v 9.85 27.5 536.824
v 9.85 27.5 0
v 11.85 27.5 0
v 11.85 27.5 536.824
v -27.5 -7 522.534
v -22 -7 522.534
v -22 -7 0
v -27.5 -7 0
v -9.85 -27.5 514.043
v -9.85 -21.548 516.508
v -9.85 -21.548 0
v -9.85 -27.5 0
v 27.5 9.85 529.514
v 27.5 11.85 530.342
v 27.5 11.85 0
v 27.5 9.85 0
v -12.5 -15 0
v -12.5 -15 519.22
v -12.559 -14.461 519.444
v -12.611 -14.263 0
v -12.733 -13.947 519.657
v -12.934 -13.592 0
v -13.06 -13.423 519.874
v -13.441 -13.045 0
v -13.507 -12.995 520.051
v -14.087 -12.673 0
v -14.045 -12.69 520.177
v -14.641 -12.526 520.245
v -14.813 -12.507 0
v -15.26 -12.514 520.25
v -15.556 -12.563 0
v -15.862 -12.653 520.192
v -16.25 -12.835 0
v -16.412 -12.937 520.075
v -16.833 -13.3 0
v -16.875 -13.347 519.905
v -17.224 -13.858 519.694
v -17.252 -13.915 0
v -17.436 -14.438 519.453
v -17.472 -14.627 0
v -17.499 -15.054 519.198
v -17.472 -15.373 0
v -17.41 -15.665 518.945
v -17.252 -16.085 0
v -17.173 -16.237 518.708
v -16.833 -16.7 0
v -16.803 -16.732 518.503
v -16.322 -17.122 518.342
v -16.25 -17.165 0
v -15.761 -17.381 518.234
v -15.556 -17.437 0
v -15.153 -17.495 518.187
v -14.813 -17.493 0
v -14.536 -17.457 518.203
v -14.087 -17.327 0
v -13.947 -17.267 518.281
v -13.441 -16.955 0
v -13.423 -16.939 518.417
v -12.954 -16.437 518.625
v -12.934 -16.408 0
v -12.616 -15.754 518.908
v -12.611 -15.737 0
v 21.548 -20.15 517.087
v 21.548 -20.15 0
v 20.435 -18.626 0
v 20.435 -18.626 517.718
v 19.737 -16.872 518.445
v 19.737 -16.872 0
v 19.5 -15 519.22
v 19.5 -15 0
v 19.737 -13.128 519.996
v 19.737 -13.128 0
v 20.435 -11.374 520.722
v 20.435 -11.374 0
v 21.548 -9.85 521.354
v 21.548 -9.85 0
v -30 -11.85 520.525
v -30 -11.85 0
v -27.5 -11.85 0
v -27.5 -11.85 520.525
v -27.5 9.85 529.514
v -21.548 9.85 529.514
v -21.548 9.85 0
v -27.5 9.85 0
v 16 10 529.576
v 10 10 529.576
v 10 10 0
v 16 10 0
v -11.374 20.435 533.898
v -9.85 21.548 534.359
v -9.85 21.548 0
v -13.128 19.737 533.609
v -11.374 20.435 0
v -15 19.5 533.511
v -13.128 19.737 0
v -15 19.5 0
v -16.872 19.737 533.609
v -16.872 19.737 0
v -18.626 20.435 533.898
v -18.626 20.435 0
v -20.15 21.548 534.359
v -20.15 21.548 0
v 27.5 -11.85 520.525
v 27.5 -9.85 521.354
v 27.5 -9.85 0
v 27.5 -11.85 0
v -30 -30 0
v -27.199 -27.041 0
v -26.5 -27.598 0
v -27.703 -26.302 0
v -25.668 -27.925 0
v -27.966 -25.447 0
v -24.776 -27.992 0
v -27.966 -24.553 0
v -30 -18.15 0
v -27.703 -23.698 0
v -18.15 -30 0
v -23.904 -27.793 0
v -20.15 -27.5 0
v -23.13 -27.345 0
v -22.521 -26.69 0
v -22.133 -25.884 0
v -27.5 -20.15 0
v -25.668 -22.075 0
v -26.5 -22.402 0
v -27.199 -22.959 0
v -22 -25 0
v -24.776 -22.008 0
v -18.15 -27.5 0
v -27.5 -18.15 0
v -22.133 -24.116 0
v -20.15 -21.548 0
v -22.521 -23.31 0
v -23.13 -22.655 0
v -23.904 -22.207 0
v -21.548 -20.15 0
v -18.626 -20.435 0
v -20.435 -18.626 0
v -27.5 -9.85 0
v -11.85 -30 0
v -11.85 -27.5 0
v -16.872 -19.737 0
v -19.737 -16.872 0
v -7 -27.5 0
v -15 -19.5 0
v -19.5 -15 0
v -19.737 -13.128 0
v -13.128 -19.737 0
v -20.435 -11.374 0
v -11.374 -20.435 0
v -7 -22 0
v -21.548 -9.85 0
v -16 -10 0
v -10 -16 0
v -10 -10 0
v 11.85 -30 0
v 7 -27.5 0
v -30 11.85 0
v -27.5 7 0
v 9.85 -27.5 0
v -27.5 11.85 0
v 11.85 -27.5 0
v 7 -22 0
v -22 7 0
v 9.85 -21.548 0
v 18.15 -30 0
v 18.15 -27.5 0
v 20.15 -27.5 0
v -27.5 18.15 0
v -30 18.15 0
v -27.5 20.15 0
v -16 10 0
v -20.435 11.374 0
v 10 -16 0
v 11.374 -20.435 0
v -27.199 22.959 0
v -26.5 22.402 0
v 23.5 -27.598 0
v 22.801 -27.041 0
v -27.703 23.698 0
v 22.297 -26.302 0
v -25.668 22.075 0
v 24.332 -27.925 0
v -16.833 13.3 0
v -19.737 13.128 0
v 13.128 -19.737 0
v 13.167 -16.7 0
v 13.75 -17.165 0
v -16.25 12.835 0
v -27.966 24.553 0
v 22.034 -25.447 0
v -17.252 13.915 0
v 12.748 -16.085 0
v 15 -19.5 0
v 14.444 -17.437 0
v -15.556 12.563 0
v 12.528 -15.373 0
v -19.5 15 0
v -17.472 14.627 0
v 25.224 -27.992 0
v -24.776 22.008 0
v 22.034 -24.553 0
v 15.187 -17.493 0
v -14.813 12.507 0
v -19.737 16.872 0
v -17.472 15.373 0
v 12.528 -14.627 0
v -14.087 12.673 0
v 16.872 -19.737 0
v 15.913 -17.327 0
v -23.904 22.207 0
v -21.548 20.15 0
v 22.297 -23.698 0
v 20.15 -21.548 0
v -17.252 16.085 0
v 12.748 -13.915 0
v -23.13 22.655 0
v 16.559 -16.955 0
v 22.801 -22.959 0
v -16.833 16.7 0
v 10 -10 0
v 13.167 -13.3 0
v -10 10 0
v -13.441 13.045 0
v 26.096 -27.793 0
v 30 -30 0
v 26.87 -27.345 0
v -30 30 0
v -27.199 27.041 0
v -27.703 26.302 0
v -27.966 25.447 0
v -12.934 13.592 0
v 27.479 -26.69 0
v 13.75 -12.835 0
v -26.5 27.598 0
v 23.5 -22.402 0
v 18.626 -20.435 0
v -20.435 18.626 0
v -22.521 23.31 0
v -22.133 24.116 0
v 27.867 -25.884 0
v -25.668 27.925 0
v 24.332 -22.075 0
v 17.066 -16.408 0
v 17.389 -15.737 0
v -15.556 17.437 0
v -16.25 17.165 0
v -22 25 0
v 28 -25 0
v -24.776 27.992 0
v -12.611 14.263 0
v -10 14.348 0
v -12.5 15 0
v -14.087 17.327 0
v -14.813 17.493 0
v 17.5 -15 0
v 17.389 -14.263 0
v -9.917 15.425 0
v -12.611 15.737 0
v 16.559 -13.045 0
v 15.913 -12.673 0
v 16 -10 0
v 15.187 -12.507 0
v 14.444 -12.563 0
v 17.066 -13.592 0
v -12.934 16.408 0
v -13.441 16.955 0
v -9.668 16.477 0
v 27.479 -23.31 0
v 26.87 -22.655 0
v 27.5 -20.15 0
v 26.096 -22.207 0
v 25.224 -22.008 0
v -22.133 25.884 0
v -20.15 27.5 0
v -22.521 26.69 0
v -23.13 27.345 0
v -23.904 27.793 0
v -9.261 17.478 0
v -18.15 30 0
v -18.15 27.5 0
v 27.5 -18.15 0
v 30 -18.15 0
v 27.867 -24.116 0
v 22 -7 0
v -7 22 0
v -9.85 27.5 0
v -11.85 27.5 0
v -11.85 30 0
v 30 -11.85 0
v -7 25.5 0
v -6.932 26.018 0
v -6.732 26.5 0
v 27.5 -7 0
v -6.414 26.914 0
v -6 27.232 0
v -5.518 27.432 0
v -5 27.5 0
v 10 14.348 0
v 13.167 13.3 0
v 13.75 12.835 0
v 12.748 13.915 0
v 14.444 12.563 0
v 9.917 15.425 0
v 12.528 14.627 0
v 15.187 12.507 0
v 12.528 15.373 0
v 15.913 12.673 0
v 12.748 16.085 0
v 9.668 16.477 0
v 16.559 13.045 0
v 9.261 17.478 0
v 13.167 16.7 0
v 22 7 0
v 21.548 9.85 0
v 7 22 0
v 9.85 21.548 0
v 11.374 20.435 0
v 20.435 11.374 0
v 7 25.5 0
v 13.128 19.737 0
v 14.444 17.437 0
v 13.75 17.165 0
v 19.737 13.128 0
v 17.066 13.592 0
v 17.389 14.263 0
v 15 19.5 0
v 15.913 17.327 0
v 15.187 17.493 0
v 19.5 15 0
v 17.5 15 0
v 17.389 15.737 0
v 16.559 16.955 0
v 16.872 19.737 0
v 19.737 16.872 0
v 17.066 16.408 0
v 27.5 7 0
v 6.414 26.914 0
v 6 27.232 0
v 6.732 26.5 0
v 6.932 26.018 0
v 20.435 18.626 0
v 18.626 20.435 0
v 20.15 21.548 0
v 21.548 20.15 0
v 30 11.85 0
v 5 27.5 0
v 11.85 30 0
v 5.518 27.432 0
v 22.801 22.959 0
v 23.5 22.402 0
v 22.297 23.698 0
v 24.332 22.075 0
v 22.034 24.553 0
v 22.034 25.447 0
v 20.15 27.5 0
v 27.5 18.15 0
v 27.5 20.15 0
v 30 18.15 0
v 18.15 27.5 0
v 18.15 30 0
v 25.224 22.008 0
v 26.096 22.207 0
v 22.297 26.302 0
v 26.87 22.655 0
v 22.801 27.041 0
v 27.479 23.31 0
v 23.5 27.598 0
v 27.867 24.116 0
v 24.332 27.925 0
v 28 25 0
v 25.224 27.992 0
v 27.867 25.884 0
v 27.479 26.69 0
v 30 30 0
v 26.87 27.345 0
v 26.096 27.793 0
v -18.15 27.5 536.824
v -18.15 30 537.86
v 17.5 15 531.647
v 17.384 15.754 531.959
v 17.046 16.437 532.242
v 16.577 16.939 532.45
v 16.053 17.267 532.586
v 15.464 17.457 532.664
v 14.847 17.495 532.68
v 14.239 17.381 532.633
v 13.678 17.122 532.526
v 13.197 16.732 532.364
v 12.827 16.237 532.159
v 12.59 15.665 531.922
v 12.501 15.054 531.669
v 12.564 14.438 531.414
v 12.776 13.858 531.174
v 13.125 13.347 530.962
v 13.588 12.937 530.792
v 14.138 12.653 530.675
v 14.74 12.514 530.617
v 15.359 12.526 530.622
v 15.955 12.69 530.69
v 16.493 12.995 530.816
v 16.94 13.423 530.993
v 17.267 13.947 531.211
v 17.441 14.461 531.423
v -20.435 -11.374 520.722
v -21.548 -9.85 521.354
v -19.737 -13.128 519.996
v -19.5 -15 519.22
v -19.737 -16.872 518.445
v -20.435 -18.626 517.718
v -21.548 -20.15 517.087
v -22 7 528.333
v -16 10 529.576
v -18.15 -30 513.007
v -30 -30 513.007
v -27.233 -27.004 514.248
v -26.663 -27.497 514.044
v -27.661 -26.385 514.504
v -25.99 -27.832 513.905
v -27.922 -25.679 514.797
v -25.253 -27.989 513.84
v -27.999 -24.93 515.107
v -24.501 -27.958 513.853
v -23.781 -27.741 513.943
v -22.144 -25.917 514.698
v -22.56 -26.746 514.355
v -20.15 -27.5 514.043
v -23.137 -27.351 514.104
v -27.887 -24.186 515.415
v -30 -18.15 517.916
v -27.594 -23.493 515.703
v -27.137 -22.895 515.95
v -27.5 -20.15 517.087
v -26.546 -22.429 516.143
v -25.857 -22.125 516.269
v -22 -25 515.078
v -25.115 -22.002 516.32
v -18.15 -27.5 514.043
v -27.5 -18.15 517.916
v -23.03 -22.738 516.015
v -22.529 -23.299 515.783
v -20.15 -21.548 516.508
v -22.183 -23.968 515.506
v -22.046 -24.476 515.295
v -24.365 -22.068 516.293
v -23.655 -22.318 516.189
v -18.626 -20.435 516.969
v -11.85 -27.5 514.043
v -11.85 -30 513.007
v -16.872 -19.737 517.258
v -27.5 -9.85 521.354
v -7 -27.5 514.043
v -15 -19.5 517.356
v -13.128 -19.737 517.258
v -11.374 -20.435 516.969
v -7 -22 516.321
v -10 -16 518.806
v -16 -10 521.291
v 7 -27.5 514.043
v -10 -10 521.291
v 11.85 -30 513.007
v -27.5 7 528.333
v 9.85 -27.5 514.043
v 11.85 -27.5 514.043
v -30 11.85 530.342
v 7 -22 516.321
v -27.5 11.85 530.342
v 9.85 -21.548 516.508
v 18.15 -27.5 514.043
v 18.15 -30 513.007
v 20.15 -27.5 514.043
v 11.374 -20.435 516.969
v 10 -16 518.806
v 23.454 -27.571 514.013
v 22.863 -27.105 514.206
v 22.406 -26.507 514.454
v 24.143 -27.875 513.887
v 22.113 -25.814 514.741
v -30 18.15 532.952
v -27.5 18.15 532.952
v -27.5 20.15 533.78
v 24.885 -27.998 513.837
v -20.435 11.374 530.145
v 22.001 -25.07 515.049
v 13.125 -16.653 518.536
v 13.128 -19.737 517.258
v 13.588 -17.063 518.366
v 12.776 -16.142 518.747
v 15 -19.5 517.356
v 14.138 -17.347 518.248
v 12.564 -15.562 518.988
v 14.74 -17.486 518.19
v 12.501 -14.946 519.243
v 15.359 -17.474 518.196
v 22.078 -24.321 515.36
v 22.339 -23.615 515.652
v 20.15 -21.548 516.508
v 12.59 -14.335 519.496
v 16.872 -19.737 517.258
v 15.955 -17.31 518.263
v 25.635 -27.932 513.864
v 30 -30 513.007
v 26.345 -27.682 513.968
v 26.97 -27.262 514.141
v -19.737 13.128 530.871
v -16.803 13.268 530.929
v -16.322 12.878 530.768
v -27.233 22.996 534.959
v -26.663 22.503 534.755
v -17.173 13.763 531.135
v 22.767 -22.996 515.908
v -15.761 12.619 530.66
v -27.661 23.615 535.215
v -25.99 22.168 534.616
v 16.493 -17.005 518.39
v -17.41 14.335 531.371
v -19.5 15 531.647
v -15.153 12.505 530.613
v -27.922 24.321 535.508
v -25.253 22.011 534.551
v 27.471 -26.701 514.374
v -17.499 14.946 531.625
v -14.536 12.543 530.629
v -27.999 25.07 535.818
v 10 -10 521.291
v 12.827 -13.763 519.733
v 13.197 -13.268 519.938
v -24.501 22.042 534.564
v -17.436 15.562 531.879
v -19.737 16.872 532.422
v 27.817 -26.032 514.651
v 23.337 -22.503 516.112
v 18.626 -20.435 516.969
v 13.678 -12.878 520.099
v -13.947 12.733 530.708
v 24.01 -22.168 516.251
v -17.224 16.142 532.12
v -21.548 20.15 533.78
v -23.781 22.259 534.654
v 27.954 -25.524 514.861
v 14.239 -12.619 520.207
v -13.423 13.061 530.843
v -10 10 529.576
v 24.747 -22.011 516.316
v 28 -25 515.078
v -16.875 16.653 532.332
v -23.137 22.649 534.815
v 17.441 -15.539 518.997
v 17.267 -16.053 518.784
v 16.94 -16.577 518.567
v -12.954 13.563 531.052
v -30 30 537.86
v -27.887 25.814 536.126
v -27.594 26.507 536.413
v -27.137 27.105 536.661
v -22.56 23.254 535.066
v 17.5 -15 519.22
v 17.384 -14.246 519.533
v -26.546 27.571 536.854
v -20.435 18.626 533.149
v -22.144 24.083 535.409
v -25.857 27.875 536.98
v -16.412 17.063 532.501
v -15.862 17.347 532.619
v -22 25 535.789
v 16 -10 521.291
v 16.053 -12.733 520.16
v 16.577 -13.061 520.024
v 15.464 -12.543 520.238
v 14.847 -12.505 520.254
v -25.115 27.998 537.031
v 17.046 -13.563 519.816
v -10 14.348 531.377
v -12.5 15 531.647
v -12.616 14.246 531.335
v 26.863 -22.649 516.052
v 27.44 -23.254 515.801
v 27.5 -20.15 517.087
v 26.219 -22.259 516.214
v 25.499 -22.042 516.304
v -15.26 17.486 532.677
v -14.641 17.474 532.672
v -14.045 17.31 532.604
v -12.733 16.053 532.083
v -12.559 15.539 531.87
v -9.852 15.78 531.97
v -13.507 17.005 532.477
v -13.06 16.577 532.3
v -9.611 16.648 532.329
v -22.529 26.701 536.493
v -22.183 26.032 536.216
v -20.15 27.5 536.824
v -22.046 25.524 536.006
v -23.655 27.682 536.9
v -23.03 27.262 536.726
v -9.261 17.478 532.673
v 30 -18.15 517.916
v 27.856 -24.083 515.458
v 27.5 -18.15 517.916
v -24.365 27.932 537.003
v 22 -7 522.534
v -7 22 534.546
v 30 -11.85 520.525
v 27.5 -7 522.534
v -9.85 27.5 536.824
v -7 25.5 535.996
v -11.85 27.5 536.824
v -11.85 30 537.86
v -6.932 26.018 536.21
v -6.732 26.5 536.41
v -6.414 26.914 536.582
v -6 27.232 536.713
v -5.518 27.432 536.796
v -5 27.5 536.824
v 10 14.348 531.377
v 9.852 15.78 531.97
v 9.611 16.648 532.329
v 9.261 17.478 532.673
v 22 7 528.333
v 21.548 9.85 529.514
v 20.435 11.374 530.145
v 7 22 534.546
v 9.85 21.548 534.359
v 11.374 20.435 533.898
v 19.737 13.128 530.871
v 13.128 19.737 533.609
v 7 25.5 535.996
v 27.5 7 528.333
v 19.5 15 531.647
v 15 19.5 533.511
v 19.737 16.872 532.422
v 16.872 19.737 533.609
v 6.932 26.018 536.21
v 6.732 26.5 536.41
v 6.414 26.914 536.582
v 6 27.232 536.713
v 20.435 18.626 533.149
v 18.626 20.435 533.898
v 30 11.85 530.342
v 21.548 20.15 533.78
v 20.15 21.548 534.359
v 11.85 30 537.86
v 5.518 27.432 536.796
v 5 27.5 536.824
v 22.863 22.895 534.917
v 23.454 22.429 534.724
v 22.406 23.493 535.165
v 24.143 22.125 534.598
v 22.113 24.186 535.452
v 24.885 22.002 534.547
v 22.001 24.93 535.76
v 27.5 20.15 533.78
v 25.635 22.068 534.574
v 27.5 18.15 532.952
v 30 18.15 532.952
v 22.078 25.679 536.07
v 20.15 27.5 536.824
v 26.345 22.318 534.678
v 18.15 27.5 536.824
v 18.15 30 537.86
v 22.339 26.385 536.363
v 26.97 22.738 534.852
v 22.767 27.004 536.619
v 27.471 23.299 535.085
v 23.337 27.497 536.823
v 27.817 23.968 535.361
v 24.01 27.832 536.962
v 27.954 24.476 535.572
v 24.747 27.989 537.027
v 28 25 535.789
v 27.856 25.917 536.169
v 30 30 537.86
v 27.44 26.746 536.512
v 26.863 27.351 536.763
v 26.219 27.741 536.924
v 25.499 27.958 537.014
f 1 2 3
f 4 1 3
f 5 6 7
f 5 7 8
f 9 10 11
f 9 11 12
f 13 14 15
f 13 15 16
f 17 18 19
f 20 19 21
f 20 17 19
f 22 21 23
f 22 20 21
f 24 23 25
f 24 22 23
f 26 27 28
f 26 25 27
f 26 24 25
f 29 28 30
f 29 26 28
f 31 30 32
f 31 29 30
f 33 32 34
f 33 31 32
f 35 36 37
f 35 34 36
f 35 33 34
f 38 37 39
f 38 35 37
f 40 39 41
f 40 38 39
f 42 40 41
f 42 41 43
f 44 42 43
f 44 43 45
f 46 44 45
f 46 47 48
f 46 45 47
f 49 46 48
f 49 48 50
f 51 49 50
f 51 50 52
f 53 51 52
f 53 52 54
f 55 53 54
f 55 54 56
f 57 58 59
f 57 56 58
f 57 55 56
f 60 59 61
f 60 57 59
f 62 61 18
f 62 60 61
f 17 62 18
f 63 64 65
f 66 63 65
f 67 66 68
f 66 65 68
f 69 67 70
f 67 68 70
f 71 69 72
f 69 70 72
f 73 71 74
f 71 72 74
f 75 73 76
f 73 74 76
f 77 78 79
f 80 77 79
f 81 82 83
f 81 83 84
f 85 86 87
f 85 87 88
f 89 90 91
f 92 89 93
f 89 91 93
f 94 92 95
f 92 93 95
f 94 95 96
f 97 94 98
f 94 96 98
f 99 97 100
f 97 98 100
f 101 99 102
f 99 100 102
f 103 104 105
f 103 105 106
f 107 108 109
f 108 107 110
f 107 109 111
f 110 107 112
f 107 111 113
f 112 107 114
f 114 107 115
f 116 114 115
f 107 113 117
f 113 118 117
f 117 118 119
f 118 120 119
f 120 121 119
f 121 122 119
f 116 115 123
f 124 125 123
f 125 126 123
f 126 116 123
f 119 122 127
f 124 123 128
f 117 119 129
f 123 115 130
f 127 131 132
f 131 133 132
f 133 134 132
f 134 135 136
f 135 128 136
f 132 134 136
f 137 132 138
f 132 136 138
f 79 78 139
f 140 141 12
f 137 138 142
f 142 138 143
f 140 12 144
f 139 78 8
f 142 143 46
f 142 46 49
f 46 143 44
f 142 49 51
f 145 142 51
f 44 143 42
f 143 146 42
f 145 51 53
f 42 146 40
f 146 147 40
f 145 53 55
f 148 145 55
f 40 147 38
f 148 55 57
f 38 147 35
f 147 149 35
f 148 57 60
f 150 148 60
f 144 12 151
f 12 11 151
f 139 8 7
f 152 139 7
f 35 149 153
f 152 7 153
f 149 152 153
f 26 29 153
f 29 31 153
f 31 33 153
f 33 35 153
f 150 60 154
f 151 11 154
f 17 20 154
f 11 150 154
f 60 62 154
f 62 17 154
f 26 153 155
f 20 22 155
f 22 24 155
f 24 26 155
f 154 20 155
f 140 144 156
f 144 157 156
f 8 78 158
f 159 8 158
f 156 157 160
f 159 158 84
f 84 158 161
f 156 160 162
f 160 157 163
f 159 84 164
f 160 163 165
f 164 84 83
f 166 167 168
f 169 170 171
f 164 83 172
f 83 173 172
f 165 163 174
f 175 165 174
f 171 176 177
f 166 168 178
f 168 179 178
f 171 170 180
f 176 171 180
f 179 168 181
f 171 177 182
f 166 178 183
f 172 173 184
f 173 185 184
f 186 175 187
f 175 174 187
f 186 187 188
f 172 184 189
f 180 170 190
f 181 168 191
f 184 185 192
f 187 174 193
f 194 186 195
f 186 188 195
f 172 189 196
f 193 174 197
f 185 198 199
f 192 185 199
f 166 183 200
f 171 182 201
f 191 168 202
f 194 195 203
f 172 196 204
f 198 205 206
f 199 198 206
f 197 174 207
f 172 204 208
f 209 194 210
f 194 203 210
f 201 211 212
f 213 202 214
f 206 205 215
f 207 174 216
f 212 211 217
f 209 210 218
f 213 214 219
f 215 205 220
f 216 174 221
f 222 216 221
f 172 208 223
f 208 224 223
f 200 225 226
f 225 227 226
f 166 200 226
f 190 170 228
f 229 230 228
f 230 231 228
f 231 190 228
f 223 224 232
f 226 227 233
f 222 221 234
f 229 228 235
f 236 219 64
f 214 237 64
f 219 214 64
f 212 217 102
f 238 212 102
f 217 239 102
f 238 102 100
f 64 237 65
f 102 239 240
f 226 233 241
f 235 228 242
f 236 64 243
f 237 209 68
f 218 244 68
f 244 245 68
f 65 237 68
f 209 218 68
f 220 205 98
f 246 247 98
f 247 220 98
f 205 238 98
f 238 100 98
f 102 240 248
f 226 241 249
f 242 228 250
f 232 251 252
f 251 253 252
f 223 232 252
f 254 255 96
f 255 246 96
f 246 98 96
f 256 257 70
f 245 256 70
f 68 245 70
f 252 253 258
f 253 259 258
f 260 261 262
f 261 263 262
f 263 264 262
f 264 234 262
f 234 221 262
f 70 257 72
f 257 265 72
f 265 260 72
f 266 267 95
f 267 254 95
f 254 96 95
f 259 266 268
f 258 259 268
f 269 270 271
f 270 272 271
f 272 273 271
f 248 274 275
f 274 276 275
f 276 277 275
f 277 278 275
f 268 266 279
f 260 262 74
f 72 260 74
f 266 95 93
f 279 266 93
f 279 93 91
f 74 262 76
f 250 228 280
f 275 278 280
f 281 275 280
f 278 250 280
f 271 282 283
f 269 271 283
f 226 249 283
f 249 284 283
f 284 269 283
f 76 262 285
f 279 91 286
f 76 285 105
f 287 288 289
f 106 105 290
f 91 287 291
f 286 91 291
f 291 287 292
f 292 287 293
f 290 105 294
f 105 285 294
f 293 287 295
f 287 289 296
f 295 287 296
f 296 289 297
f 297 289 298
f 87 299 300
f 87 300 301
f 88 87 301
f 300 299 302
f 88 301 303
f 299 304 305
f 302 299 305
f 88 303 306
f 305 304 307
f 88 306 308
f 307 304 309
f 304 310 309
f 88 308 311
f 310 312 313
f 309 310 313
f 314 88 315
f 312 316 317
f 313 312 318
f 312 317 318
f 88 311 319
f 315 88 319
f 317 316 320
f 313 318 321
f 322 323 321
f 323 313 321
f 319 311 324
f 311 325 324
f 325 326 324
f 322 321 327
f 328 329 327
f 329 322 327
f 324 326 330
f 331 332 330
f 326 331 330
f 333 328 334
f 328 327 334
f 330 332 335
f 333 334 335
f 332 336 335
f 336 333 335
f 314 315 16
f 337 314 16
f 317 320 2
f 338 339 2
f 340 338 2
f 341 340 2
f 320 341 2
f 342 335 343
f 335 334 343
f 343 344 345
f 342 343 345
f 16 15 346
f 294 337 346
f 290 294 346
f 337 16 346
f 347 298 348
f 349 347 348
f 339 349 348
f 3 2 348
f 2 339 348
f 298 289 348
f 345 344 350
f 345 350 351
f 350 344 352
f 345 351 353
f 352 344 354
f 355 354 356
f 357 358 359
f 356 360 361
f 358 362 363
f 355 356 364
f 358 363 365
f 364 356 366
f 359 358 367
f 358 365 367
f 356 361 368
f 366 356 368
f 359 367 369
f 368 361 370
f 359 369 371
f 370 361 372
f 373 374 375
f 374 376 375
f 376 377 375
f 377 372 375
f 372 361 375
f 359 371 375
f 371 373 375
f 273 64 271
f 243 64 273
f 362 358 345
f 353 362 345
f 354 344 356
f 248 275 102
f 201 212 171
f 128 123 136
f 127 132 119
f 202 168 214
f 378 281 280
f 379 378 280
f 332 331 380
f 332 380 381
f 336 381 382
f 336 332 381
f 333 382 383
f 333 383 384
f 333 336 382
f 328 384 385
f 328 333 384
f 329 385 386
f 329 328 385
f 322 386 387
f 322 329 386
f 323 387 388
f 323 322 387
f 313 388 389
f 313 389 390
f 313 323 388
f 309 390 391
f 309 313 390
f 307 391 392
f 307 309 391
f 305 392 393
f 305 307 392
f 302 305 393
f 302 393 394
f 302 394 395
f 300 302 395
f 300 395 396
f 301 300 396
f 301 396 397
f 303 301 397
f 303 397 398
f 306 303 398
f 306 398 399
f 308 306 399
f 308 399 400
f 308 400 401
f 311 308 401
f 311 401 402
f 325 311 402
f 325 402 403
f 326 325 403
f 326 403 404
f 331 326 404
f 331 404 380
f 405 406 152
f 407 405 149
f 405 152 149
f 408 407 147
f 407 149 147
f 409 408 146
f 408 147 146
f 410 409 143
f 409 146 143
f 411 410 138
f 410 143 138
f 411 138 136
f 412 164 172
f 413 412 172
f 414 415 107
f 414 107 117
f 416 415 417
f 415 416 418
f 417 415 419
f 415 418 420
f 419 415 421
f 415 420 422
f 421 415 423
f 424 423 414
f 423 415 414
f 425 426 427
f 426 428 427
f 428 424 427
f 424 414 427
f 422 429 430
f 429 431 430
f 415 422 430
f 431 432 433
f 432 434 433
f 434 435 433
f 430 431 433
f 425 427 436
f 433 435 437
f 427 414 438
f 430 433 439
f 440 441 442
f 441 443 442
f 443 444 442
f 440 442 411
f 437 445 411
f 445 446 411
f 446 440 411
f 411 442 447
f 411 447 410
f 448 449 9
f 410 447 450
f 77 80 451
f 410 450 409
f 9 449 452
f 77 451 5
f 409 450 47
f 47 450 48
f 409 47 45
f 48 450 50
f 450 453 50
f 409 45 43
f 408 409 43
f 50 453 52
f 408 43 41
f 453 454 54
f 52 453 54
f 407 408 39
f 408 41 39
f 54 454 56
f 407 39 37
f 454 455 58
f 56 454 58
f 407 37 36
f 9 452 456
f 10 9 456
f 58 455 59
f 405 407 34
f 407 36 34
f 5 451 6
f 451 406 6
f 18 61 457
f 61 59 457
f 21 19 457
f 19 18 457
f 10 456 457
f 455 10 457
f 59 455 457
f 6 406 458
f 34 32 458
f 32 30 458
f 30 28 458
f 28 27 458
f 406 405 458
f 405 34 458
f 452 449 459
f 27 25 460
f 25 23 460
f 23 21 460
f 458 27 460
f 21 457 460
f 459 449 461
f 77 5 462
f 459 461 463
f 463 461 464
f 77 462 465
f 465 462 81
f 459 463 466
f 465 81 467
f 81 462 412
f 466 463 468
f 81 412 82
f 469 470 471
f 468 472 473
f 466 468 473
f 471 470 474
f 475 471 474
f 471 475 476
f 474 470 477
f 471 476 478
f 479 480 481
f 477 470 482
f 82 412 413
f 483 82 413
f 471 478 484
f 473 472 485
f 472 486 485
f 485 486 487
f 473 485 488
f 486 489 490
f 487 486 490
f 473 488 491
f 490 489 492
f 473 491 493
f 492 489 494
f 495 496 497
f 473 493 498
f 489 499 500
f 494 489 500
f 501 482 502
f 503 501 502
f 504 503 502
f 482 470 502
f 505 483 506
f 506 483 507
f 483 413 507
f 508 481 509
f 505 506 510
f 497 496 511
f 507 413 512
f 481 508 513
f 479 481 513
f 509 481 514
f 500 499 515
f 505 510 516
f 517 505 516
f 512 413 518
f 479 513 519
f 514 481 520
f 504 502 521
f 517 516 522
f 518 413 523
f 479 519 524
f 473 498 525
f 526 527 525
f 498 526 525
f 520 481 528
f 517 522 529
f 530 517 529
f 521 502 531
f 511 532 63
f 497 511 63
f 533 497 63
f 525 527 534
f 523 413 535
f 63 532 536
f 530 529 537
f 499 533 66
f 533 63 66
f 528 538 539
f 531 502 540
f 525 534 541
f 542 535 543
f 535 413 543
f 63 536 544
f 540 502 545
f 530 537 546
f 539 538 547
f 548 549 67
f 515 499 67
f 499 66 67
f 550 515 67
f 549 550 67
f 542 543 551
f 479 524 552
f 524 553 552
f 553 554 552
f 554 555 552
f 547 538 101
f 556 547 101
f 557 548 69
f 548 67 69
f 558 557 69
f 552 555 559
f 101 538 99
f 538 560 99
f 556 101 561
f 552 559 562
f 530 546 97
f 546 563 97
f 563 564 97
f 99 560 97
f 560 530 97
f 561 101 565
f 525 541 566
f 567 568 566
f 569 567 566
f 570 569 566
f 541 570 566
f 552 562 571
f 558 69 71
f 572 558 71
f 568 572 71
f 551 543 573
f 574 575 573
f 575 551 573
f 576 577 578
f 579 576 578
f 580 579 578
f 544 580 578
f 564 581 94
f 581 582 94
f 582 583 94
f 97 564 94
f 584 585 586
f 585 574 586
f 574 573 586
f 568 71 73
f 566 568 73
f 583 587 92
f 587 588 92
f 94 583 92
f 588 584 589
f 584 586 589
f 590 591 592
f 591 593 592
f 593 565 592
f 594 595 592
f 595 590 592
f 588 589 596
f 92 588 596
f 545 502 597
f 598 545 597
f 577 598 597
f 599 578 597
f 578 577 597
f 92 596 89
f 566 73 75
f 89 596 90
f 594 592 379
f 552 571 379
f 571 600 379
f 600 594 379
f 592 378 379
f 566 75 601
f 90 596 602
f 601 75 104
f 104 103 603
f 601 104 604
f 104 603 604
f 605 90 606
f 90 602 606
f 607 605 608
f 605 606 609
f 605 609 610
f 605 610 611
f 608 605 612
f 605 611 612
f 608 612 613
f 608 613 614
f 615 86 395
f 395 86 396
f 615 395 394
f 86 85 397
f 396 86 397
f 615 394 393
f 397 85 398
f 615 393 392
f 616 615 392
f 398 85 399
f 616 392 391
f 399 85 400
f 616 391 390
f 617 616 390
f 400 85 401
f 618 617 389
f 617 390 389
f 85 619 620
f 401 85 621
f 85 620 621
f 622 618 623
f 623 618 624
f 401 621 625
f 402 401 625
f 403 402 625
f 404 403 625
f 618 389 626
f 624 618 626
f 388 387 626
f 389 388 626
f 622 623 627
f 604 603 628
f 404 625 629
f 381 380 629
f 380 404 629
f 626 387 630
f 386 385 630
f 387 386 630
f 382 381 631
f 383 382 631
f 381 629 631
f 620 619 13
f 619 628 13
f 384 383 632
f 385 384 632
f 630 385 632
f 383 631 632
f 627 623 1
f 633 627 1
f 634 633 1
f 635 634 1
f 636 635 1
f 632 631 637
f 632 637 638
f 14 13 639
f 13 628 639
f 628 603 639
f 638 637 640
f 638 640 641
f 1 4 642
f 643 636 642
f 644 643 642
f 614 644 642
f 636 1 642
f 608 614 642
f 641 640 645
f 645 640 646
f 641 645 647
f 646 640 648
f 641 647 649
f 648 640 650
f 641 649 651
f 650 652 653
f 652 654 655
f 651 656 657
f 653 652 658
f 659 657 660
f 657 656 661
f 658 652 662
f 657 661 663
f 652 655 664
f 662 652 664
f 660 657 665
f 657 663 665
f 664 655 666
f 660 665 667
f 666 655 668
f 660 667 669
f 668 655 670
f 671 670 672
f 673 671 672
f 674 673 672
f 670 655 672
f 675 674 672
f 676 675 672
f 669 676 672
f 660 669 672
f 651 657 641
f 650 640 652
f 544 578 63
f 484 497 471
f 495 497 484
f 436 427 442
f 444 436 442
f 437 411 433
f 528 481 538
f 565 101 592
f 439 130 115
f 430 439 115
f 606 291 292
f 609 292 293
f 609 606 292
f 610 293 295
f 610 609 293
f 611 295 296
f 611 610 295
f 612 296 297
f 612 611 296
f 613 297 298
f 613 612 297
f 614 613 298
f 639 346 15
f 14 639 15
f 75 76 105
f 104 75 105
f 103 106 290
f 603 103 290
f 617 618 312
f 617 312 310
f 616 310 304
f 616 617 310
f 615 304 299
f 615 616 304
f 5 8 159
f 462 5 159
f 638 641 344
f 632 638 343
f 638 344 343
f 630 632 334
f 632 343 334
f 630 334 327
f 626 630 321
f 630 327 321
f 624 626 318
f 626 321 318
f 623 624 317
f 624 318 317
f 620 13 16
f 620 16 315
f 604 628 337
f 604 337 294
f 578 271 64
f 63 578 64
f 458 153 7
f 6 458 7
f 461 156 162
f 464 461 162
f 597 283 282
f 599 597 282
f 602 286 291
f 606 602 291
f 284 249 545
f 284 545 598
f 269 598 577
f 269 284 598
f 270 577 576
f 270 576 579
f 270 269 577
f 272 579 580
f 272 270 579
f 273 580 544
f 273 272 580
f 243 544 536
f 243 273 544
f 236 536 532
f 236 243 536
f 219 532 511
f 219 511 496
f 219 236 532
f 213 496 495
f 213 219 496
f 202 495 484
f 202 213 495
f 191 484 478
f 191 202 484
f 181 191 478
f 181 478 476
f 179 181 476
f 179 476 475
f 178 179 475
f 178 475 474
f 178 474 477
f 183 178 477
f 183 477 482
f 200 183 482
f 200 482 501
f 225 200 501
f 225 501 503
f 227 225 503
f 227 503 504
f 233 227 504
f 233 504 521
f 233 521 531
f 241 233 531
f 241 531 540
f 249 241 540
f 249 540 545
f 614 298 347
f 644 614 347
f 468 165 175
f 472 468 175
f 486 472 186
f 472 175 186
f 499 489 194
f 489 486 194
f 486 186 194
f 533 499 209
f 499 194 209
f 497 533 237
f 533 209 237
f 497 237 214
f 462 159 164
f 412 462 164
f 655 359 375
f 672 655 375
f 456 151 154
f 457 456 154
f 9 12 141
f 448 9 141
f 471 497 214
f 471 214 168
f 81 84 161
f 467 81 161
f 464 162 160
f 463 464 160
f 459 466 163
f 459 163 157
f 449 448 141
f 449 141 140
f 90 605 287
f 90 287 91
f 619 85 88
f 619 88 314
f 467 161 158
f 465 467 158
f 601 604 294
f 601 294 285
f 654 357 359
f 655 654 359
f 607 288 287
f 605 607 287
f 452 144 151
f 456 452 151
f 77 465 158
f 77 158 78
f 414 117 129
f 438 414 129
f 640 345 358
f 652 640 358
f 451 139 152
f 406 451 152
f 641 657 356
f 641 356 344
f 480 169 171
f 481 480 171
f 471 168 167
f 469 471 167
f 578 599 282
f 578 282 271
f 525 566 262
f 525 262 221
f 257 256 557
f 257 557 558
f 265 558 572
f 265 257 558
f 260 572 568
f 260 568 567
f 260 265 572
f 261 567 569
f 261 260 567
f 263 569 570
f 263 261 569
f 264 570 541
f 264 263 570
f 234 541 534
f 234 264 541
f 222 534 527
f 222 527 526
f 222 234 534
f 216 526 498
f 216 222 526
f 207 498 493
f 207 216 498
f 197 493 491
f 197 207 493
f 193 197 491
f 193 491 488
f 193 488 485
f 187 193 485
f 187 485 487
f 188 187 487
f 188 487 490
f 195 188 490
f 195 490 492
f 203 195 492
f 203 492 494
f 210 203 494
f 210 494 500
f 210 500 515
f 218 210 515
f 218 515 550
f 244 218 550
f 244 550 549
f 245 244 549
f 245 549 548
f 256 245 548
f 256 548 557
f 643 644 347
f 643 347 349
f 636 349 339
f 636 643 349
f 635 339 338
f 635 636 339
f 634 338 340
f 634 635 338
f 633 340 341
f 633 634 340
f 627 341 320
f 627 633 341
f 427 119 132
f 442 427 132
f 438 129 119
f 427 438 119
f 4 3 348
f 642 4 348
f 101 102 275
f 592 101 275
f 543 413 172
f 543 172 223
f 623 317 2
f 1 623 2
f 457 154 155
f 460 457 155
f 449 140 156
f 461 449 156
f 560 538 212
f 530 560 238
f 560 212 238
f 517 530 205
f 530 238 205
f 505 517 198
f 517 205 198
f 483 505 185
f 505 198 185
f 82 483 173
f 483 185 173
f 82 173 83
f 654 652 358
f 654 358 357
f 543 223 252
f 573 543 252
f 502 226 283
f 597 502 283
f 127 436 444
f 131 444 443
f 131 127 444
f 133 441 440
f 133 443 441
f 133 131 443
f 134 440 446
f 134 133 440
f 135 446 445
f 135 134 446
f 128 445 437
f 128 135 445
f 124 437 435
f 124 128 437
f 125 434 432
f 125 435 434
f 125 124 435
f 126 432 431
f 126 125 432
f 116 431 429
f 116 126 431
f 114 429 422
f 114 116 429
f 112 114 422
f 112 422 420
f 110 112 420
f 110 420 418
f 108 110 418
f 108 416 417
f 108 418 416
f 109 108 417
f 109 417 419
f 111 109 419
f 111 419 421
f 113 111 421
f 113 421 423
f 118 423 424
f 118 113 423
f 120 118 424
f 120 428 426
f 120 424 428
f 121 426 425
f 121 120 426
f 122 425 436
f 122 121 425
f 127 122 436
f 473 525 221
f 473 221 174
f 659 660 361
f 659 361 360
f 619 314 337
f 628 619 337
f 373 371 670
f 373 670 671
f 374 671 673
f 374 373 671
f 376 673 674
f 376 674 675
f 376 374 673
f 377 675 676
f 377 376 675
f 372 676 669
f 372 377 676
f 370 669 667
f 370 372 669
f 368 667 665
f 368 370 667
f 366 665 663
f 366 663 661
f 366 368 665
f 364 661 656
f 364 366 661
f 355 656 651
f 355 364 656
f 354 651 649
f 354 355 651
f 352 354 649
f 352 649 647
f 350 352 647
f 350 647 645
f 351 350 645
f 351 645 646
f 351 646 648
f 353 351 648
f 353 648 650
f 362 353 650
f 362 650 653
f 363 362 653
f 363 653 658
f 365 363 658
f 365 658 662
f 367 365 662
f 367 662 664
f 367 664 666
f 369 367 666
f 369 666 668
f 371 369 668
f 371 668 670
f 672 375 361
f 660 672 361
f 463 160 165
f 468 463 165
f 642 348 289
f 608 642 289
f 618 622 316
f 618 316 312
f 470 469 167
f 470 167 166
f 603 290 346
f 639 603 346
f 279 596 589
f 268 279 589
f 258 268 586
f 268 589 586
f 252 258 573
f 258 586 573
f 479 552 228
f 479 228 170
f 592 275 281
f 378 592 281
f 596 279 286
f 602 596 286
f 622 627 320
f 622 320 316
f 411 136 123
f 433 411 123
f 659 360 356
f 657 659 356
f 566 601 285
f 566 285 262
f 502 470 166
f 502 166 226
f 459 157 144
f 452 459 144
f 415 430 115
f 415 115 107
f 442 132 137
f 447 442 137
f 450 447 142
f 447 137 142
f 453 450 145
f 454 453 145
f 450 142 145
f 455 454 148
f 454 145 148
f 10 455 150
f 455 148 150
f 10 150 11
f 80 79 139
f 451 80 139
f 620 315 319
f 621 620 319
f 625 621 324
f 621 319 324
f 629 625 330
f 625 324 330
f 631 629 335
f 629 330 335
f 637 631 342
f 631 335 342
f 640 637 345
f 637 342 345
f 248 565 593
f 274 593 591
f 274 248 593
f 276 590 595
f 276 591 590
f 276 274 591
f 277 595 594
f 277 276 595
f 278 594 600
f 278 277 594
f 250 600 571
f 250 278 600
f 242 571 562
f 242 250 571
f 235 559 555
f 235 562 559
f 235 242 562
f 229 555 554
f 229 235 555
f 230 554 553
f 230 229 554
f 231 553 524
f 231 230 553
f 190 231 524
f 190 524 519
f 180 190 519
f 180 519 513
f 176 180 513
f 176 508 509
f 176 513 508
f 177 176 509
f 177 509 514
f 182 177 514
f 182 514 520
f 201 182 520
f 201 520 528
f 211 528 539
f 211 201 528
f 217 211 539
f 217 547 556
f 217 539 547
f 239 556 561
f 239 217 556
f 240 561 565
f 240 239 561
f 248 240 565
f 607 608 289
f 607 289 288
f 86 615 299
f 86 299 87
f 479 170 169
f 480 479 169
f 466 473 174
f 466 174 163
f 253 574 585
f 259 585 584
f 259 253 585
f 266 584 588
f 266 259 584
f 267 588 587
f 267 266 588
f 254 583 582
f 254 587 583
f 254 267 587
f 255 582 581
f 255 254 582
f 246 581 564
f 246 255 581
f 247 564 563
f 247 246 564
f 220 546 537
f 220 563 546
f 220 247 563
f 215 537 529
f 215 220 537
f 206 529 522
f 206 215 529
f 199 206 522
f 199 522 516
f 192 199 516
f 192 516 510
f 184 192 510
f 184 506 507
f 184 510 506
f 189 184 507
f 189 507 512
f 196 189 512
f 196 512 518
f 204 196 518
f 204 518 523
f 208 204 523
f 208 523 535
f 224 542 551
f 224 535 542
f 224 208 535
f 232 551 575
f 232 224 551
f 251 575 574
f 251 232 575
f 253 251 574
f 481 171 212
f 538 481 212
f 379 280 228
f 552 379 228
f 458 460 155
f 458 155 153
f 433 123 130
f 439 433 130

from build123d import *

# Parameters (mm, degrees)
F0_R          = 3
F0_R_2        = 2.5
F1_DEPTH      = 537.86
F2_R          = 2
F3_R          = 7
F5_DEPTH      = 30
F5_DEPTH_BACK = 30


# Not quite as in the source:
# - a feature names something its author has since deleted; it is built from what else it names


with BuildPart() as f1:
    # F0 (on Top) → F1 (new body)
    with BuildSketch(Plane.XY):
        with BuildLine():
            Line((18.15, -30), (30, -30))
            Line((30, -30), (30, -18.15))
            Line((30, -18.15), (27.5, -18.15))
            Line((27.5, -18.15), (27.5, -20.15))
            Line((27.5, -20.15), (21.5477069044, -20.15))
            ThreePointArc((21.5477069044, -20.15), (19.5, -15), (21.5477069044, -9.85))
            Line((21.5477069044, -9.85), (27.5, -9.85))
            Line((27.5, -9.85), (27.5, -11.85))
            Line((27.5, -11.85), (30, -11.85))
            Line((30, -11.85), (30, 11.85))
            Line((30, 11.85), (27.5, 11.85))
            Line((27.5, 11.85), (27.5, 9.85))
            Line((27.5, 9.85), (21.5477069044, 9.85))
            ThreePointArc((21.5477069044, 9.85), (19.5, 15), (21.5477069044, 20.15))
            Line((21.5477069044, 20.15), (27.5, 20.15))
            Line((27.5, 20.15), (27.5, 18.15))
            Line((27.5, 18.15), (30, 18.15))
            Line((30, 18.15), (30, 30))
            Line((30, 30), (18.15, 30))
            Line((18.15, 30), (18.15, 27.5))
            Line((18.15, 27.5), (20.15, 27.5))
            Line((20.15, 27.5), (20.15, 21.5477069044))
            ThreePointArc((20.15, 21.5477069044), (15, 19.5), (9.85, 21.5477069044))
            Line((9.85, 21.5477069044), (9.85, 27.5))
            Line((9.85, 27.5), (11.85, 27.5))
            Line((11.85, 27.5), (11.85, 30))
            Line((11.85, 30), (-11.85, 30))
            Line((-11.85, 30), (-11.85, 27.5))
            Line((-11.85, 27.5), (-9.85, 27.5))
            Line((-9.85, 27.5), (-9.85, 21.5477069044))
            ThreePointArc((-9.85, 21.5477069044), (-15, 19.5), (-20.15, 21.5477069044))
            Line((-20.15, 21.5477069044), (-20.15, 27.5))
            Line((-20.15, 27.5), (-18.15, 27.5))
            Line((-18.15, 27.5), (-18.15, 30))
            Line((-18.15, 30), (-30, 30))
            Line((-30, 30), (-30, 18.15))
            Line((-30, 18.15), (-27.5, 18.15))
            Line((-27.5, 18.15), (-27.5, 20.15))
            Line((-27.5, 20.15), (-21.5477069044, 20.15))
            ThreePointArc((-21.5477069044, 20.15), (-19.5, 15), (-21.5477069044, 9.85))
            Line((-21.5477069044, 9.85), (-27.5, 9.85))
            Line((-27.5, 9.85), (-27.5, 11.85))
            Line((-27.5, 11.85), (-30, 11.85))
            Line((-30, 11.85), (-30, -11.85))
            Line((-30, -11.85), (-27.5, -11.85))
            Line((-27.5, -11.85), (-27.5, -9.85))
            Line((-27.5, -9.85), (-21.5477069044, -9.85))
            ThreePointArc((-21.5477069044, -9.85), (-19.5, -15), (-21.5477069044, -20.15))
            Line((-21.5477069044, -20.15), (-27.5, -20.15))
            Line((-27.5, -20.15), (-27.5, -18.15))
            Line((-27.5, -18.15), (-30, -18.15))
            Line((-30, -18.15), (-30, -30))
            Line((-30, -30), (-18.15, -30))
            Line((-18.15, -30), (-18.15, -27.5))
            Line((-18.15, -27.5), (-20.15, -27.5))
            Line((-20.15, -27.5), (-20.15, -21.5477069044))
            ThreePointArc((-20.15, -21.5477069044), (-15, -19.5), (-9.85, -21.5477069044))
            Line((-9.85, -21.5477069044), (-9.85, -27.5))
            Line((-9.85, -27.5), (-11.85, -27.5))
            Line((-11.85, -27.5), (-11.85, -30))
            Line((-11.85, -30), (11.85, -30))
            Line((11.85, -30), (11.85, -27.5))
            Line((11.85, -27.5), (9.85, -27.5))
            Line((9.85, -27.5), (9.85, -21.5477069044))
            ThreePointArc((9.85, -21.5477069044), (15, -19.5), (20.15, -21.5477069044))
            Line((20.15, -21.5477069044), (20.15, -27.5))
            Line((20.15, -27.5), (18.15, -27.5))
            Line((18.15, -27.5), (18.15, -30))
        make_face()
        with Locations((-25, -25)):
            Circle(F0_R, mode=Mode.SUBTRACT)
        with Locations((-15, -15)):
            Circle(F0_R_2, mode=Mode.SUBTRACT)
        with Locations((25, -25)):
            Circle(F0_R, mode=Mode.SUBTRACT)
        with Locations((15, -15)):
            Circle(F0_R_2, mode=Mode.SUBTRACT)
        with Locations((-25, 25)):
            Circle(F0_R, mode=Mode.SUBTRACT)
        with Locations((-15, 15)):
            Circle(F0_R_2, mode=Mode.SUBTRACT)
        Polygon((-7, 22), (-7, 27.5), (0, 27.5), (7, 27.5), (7, 22), (10, 16), (10, 10), (16, 10), (22, 7), (27.5, 7), (27.5, 0), (27.5, -7), (22, -7), (16, -10), (10, -10), (10, -16), (7, -22), (7, -27.5), (0, -27.5), (-7, -27.5), (-7, -22), (-10, -16), (-10, -10), (-16, -10), (-22, -7), (-27.5, -7), (-27.5, 0), (-27.5, 7), (-22, 7), (-16, 10), (-10, 10), (-10, 16), align=None, mode=Mode.SUBTRACT)
        with Locations((15, 15)):
            Circle(F0_R_2, mode=Mode.SUBTRACT)
        with Locations((25, 25)):
            Circle(F0_R, mode=Mode.SUBTRACT)
    extrude(amount=F1_DEPTH)

    # F2
    f2_edges = [f1.edges().sort_by_distance(p)[0] for p in [
        (-7, 27.5, 268.93),
        (7, 27.5, 268.93),
    ]]
    fillet(f2_edges, radius=F2_R)

    # F3
    f3_edges = [f1.edges().sort_by_distance(p)[0] for p in [
        (-10, 16, 268.93),
        (10, 16, 268.93),
    ]]
    fillet(f3_edges, radius=F3_R)

    # F4 (on Right) → F5 (cut, two sides)
    with BuildSketch(Plane.YZ) as f5_sk:
        Polygon((-77.6874923482, 797.8406045251), (-234.1260457354, 733.041634034), (-126.4385533872, 473.061029509), (30, 537.86), align=None)
    extrude(amount=F5_DEPTH, mode=Mode.SUBTRACT)
    extrude(f5_sk.sketch, amount=-F5_DEPTH_BACK, mode=Mode.SUBTRACT)


solid = f1.part
